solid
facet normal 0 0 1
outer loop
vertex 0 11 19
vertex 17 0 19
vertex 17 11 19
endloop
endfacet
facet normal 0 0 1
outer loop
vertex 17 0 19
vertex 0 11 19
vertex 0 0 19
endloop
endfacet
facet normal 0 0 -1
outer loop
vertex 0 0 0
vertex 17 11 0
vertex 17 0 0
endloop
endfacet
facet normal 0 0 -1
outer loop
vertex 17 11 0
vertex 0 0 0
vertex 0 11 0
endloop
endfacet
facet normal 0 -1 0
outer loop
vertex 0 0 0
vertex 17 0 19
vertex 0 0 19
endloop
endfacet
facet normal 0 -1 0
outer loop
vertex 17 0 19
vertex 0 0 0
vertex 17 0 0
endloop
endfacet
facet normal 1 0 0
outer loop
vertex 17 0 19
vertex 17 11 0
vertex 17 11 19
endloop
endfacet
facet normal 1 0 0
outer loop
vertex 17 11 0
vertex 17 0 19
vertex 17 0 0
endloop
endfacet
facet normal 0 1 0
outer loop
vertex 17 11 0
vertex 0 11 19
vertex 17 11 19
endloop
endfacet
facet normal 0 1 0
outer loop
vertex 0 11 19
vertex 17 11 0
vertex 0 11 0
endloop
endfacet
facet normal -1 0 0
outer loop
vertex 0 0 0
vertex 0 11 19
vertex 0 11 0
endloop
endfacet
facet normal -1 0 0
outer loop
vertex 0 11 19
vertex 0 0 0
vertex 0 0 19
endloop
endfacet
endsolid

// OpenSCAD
// Generated by SolidPython 1.0.1 on 2020-07-29 00:46:56


cube(size = [17, 11, 19]);
/***********************************************
*********      SolidPython code:      **********
************************************************
 
# import packages: SolidPython
from solid import *
from solid.utils import *
from itertools import chain, combinations, permutations


class Resize:

    def __init__(self, scad_file):
        self.scad_file = scad_file
        #self.scad_file = import_scad(scad_file)
        # cone/cylinder param:
        self.r1 = 0
        self.r2 = 0
        self.h = 0
        # rectangular prism param:
        self.w = 0
        self.l = 0
        # ellipse param:
        self.r = 0

    # import OpenScad code (file name corresponds to shape)


    # classify shape + parameters
    def assign(self, param1, param2, param3):
        if self.scad_file == 'cone.scad':
            self.r1 = param1
            self.r2 = param2
            self.h = param3
        elif self.scad_file == 'cylinder.scad':
            self.r1 = param1
            self.r2 = param2
            self.h = param3
        elif self.scad_file == 'rectangularPrism.scad':
            self.h = param1
            self.l = param2
            self.w = param3
        else:
            self.r = param1
            self.h = param2

    # resize parameters
    def iterate(self):
        x = range(3, 20, 2)
        i = 1
        if self.scad_file == 'cone.scad':
            tempList = list(permutations(x, 2))
            for temp in tempList:
                param1 = temp[0]
                param2 = temp[1]
                filepath = 'produced_scad_files/' + 'cone' + str(param1) + '_' + str(param2) + '_' + '.scad'
                scad_render_to_file(cylinder(h=param1, r1=param2, r2=0), filepath)

        elif self.scad_file == 'cylinder.scad':
            tempList = list(permutations(x, 3))
            for temp in tempList:
                param1 = temp[0]
                param2 = temp[1]
                filepath = 'produced_scad_files/' + 'cylinder' + str(param1) + '_' + str(param2) + '_' + '.scad'
                scad_render_to_file(cylinder(h=param1, r1=param2, r2=param2), filepath)

        elif self.scad_file == 'rectangularPrism.scad':
            tempList = list(permutations(x, 3))
            for temp in tempList:
                param1 = temp[0]
                param2 = temp[1]
                param3 = temp[2]
                filepath = 'produced_scad_files/' + 'rectangularPrism' + str(param1) + '_' + str(param2) + '_' + str(
                    param3) + '.scad'
                scad_render_to_file(cube(size=(param1, param2, param3)), filepath)

        elif self.scad_file == 'ellipse.scad':
            tempList = list(permutations(x, 4))
            for temp in tempList:
                param1 = temp[0]
                param2 = temp[1]
                param3 = temp[2]
                param4 = temp[3]
                filepath = 'produced_scad_files/' + 'ellipse' + str(param1) + '_' + str(param2) + '_' + str(param3) + '_' + str(param4) + '.scad'
                scad_render_to_file(scale([param1, param2, param3])(sphere(r=param4)), filepath)

    def render_to_scadfile(self):
        scad_render_to_file(scad, 'example.scad') 
 
************************************************/
